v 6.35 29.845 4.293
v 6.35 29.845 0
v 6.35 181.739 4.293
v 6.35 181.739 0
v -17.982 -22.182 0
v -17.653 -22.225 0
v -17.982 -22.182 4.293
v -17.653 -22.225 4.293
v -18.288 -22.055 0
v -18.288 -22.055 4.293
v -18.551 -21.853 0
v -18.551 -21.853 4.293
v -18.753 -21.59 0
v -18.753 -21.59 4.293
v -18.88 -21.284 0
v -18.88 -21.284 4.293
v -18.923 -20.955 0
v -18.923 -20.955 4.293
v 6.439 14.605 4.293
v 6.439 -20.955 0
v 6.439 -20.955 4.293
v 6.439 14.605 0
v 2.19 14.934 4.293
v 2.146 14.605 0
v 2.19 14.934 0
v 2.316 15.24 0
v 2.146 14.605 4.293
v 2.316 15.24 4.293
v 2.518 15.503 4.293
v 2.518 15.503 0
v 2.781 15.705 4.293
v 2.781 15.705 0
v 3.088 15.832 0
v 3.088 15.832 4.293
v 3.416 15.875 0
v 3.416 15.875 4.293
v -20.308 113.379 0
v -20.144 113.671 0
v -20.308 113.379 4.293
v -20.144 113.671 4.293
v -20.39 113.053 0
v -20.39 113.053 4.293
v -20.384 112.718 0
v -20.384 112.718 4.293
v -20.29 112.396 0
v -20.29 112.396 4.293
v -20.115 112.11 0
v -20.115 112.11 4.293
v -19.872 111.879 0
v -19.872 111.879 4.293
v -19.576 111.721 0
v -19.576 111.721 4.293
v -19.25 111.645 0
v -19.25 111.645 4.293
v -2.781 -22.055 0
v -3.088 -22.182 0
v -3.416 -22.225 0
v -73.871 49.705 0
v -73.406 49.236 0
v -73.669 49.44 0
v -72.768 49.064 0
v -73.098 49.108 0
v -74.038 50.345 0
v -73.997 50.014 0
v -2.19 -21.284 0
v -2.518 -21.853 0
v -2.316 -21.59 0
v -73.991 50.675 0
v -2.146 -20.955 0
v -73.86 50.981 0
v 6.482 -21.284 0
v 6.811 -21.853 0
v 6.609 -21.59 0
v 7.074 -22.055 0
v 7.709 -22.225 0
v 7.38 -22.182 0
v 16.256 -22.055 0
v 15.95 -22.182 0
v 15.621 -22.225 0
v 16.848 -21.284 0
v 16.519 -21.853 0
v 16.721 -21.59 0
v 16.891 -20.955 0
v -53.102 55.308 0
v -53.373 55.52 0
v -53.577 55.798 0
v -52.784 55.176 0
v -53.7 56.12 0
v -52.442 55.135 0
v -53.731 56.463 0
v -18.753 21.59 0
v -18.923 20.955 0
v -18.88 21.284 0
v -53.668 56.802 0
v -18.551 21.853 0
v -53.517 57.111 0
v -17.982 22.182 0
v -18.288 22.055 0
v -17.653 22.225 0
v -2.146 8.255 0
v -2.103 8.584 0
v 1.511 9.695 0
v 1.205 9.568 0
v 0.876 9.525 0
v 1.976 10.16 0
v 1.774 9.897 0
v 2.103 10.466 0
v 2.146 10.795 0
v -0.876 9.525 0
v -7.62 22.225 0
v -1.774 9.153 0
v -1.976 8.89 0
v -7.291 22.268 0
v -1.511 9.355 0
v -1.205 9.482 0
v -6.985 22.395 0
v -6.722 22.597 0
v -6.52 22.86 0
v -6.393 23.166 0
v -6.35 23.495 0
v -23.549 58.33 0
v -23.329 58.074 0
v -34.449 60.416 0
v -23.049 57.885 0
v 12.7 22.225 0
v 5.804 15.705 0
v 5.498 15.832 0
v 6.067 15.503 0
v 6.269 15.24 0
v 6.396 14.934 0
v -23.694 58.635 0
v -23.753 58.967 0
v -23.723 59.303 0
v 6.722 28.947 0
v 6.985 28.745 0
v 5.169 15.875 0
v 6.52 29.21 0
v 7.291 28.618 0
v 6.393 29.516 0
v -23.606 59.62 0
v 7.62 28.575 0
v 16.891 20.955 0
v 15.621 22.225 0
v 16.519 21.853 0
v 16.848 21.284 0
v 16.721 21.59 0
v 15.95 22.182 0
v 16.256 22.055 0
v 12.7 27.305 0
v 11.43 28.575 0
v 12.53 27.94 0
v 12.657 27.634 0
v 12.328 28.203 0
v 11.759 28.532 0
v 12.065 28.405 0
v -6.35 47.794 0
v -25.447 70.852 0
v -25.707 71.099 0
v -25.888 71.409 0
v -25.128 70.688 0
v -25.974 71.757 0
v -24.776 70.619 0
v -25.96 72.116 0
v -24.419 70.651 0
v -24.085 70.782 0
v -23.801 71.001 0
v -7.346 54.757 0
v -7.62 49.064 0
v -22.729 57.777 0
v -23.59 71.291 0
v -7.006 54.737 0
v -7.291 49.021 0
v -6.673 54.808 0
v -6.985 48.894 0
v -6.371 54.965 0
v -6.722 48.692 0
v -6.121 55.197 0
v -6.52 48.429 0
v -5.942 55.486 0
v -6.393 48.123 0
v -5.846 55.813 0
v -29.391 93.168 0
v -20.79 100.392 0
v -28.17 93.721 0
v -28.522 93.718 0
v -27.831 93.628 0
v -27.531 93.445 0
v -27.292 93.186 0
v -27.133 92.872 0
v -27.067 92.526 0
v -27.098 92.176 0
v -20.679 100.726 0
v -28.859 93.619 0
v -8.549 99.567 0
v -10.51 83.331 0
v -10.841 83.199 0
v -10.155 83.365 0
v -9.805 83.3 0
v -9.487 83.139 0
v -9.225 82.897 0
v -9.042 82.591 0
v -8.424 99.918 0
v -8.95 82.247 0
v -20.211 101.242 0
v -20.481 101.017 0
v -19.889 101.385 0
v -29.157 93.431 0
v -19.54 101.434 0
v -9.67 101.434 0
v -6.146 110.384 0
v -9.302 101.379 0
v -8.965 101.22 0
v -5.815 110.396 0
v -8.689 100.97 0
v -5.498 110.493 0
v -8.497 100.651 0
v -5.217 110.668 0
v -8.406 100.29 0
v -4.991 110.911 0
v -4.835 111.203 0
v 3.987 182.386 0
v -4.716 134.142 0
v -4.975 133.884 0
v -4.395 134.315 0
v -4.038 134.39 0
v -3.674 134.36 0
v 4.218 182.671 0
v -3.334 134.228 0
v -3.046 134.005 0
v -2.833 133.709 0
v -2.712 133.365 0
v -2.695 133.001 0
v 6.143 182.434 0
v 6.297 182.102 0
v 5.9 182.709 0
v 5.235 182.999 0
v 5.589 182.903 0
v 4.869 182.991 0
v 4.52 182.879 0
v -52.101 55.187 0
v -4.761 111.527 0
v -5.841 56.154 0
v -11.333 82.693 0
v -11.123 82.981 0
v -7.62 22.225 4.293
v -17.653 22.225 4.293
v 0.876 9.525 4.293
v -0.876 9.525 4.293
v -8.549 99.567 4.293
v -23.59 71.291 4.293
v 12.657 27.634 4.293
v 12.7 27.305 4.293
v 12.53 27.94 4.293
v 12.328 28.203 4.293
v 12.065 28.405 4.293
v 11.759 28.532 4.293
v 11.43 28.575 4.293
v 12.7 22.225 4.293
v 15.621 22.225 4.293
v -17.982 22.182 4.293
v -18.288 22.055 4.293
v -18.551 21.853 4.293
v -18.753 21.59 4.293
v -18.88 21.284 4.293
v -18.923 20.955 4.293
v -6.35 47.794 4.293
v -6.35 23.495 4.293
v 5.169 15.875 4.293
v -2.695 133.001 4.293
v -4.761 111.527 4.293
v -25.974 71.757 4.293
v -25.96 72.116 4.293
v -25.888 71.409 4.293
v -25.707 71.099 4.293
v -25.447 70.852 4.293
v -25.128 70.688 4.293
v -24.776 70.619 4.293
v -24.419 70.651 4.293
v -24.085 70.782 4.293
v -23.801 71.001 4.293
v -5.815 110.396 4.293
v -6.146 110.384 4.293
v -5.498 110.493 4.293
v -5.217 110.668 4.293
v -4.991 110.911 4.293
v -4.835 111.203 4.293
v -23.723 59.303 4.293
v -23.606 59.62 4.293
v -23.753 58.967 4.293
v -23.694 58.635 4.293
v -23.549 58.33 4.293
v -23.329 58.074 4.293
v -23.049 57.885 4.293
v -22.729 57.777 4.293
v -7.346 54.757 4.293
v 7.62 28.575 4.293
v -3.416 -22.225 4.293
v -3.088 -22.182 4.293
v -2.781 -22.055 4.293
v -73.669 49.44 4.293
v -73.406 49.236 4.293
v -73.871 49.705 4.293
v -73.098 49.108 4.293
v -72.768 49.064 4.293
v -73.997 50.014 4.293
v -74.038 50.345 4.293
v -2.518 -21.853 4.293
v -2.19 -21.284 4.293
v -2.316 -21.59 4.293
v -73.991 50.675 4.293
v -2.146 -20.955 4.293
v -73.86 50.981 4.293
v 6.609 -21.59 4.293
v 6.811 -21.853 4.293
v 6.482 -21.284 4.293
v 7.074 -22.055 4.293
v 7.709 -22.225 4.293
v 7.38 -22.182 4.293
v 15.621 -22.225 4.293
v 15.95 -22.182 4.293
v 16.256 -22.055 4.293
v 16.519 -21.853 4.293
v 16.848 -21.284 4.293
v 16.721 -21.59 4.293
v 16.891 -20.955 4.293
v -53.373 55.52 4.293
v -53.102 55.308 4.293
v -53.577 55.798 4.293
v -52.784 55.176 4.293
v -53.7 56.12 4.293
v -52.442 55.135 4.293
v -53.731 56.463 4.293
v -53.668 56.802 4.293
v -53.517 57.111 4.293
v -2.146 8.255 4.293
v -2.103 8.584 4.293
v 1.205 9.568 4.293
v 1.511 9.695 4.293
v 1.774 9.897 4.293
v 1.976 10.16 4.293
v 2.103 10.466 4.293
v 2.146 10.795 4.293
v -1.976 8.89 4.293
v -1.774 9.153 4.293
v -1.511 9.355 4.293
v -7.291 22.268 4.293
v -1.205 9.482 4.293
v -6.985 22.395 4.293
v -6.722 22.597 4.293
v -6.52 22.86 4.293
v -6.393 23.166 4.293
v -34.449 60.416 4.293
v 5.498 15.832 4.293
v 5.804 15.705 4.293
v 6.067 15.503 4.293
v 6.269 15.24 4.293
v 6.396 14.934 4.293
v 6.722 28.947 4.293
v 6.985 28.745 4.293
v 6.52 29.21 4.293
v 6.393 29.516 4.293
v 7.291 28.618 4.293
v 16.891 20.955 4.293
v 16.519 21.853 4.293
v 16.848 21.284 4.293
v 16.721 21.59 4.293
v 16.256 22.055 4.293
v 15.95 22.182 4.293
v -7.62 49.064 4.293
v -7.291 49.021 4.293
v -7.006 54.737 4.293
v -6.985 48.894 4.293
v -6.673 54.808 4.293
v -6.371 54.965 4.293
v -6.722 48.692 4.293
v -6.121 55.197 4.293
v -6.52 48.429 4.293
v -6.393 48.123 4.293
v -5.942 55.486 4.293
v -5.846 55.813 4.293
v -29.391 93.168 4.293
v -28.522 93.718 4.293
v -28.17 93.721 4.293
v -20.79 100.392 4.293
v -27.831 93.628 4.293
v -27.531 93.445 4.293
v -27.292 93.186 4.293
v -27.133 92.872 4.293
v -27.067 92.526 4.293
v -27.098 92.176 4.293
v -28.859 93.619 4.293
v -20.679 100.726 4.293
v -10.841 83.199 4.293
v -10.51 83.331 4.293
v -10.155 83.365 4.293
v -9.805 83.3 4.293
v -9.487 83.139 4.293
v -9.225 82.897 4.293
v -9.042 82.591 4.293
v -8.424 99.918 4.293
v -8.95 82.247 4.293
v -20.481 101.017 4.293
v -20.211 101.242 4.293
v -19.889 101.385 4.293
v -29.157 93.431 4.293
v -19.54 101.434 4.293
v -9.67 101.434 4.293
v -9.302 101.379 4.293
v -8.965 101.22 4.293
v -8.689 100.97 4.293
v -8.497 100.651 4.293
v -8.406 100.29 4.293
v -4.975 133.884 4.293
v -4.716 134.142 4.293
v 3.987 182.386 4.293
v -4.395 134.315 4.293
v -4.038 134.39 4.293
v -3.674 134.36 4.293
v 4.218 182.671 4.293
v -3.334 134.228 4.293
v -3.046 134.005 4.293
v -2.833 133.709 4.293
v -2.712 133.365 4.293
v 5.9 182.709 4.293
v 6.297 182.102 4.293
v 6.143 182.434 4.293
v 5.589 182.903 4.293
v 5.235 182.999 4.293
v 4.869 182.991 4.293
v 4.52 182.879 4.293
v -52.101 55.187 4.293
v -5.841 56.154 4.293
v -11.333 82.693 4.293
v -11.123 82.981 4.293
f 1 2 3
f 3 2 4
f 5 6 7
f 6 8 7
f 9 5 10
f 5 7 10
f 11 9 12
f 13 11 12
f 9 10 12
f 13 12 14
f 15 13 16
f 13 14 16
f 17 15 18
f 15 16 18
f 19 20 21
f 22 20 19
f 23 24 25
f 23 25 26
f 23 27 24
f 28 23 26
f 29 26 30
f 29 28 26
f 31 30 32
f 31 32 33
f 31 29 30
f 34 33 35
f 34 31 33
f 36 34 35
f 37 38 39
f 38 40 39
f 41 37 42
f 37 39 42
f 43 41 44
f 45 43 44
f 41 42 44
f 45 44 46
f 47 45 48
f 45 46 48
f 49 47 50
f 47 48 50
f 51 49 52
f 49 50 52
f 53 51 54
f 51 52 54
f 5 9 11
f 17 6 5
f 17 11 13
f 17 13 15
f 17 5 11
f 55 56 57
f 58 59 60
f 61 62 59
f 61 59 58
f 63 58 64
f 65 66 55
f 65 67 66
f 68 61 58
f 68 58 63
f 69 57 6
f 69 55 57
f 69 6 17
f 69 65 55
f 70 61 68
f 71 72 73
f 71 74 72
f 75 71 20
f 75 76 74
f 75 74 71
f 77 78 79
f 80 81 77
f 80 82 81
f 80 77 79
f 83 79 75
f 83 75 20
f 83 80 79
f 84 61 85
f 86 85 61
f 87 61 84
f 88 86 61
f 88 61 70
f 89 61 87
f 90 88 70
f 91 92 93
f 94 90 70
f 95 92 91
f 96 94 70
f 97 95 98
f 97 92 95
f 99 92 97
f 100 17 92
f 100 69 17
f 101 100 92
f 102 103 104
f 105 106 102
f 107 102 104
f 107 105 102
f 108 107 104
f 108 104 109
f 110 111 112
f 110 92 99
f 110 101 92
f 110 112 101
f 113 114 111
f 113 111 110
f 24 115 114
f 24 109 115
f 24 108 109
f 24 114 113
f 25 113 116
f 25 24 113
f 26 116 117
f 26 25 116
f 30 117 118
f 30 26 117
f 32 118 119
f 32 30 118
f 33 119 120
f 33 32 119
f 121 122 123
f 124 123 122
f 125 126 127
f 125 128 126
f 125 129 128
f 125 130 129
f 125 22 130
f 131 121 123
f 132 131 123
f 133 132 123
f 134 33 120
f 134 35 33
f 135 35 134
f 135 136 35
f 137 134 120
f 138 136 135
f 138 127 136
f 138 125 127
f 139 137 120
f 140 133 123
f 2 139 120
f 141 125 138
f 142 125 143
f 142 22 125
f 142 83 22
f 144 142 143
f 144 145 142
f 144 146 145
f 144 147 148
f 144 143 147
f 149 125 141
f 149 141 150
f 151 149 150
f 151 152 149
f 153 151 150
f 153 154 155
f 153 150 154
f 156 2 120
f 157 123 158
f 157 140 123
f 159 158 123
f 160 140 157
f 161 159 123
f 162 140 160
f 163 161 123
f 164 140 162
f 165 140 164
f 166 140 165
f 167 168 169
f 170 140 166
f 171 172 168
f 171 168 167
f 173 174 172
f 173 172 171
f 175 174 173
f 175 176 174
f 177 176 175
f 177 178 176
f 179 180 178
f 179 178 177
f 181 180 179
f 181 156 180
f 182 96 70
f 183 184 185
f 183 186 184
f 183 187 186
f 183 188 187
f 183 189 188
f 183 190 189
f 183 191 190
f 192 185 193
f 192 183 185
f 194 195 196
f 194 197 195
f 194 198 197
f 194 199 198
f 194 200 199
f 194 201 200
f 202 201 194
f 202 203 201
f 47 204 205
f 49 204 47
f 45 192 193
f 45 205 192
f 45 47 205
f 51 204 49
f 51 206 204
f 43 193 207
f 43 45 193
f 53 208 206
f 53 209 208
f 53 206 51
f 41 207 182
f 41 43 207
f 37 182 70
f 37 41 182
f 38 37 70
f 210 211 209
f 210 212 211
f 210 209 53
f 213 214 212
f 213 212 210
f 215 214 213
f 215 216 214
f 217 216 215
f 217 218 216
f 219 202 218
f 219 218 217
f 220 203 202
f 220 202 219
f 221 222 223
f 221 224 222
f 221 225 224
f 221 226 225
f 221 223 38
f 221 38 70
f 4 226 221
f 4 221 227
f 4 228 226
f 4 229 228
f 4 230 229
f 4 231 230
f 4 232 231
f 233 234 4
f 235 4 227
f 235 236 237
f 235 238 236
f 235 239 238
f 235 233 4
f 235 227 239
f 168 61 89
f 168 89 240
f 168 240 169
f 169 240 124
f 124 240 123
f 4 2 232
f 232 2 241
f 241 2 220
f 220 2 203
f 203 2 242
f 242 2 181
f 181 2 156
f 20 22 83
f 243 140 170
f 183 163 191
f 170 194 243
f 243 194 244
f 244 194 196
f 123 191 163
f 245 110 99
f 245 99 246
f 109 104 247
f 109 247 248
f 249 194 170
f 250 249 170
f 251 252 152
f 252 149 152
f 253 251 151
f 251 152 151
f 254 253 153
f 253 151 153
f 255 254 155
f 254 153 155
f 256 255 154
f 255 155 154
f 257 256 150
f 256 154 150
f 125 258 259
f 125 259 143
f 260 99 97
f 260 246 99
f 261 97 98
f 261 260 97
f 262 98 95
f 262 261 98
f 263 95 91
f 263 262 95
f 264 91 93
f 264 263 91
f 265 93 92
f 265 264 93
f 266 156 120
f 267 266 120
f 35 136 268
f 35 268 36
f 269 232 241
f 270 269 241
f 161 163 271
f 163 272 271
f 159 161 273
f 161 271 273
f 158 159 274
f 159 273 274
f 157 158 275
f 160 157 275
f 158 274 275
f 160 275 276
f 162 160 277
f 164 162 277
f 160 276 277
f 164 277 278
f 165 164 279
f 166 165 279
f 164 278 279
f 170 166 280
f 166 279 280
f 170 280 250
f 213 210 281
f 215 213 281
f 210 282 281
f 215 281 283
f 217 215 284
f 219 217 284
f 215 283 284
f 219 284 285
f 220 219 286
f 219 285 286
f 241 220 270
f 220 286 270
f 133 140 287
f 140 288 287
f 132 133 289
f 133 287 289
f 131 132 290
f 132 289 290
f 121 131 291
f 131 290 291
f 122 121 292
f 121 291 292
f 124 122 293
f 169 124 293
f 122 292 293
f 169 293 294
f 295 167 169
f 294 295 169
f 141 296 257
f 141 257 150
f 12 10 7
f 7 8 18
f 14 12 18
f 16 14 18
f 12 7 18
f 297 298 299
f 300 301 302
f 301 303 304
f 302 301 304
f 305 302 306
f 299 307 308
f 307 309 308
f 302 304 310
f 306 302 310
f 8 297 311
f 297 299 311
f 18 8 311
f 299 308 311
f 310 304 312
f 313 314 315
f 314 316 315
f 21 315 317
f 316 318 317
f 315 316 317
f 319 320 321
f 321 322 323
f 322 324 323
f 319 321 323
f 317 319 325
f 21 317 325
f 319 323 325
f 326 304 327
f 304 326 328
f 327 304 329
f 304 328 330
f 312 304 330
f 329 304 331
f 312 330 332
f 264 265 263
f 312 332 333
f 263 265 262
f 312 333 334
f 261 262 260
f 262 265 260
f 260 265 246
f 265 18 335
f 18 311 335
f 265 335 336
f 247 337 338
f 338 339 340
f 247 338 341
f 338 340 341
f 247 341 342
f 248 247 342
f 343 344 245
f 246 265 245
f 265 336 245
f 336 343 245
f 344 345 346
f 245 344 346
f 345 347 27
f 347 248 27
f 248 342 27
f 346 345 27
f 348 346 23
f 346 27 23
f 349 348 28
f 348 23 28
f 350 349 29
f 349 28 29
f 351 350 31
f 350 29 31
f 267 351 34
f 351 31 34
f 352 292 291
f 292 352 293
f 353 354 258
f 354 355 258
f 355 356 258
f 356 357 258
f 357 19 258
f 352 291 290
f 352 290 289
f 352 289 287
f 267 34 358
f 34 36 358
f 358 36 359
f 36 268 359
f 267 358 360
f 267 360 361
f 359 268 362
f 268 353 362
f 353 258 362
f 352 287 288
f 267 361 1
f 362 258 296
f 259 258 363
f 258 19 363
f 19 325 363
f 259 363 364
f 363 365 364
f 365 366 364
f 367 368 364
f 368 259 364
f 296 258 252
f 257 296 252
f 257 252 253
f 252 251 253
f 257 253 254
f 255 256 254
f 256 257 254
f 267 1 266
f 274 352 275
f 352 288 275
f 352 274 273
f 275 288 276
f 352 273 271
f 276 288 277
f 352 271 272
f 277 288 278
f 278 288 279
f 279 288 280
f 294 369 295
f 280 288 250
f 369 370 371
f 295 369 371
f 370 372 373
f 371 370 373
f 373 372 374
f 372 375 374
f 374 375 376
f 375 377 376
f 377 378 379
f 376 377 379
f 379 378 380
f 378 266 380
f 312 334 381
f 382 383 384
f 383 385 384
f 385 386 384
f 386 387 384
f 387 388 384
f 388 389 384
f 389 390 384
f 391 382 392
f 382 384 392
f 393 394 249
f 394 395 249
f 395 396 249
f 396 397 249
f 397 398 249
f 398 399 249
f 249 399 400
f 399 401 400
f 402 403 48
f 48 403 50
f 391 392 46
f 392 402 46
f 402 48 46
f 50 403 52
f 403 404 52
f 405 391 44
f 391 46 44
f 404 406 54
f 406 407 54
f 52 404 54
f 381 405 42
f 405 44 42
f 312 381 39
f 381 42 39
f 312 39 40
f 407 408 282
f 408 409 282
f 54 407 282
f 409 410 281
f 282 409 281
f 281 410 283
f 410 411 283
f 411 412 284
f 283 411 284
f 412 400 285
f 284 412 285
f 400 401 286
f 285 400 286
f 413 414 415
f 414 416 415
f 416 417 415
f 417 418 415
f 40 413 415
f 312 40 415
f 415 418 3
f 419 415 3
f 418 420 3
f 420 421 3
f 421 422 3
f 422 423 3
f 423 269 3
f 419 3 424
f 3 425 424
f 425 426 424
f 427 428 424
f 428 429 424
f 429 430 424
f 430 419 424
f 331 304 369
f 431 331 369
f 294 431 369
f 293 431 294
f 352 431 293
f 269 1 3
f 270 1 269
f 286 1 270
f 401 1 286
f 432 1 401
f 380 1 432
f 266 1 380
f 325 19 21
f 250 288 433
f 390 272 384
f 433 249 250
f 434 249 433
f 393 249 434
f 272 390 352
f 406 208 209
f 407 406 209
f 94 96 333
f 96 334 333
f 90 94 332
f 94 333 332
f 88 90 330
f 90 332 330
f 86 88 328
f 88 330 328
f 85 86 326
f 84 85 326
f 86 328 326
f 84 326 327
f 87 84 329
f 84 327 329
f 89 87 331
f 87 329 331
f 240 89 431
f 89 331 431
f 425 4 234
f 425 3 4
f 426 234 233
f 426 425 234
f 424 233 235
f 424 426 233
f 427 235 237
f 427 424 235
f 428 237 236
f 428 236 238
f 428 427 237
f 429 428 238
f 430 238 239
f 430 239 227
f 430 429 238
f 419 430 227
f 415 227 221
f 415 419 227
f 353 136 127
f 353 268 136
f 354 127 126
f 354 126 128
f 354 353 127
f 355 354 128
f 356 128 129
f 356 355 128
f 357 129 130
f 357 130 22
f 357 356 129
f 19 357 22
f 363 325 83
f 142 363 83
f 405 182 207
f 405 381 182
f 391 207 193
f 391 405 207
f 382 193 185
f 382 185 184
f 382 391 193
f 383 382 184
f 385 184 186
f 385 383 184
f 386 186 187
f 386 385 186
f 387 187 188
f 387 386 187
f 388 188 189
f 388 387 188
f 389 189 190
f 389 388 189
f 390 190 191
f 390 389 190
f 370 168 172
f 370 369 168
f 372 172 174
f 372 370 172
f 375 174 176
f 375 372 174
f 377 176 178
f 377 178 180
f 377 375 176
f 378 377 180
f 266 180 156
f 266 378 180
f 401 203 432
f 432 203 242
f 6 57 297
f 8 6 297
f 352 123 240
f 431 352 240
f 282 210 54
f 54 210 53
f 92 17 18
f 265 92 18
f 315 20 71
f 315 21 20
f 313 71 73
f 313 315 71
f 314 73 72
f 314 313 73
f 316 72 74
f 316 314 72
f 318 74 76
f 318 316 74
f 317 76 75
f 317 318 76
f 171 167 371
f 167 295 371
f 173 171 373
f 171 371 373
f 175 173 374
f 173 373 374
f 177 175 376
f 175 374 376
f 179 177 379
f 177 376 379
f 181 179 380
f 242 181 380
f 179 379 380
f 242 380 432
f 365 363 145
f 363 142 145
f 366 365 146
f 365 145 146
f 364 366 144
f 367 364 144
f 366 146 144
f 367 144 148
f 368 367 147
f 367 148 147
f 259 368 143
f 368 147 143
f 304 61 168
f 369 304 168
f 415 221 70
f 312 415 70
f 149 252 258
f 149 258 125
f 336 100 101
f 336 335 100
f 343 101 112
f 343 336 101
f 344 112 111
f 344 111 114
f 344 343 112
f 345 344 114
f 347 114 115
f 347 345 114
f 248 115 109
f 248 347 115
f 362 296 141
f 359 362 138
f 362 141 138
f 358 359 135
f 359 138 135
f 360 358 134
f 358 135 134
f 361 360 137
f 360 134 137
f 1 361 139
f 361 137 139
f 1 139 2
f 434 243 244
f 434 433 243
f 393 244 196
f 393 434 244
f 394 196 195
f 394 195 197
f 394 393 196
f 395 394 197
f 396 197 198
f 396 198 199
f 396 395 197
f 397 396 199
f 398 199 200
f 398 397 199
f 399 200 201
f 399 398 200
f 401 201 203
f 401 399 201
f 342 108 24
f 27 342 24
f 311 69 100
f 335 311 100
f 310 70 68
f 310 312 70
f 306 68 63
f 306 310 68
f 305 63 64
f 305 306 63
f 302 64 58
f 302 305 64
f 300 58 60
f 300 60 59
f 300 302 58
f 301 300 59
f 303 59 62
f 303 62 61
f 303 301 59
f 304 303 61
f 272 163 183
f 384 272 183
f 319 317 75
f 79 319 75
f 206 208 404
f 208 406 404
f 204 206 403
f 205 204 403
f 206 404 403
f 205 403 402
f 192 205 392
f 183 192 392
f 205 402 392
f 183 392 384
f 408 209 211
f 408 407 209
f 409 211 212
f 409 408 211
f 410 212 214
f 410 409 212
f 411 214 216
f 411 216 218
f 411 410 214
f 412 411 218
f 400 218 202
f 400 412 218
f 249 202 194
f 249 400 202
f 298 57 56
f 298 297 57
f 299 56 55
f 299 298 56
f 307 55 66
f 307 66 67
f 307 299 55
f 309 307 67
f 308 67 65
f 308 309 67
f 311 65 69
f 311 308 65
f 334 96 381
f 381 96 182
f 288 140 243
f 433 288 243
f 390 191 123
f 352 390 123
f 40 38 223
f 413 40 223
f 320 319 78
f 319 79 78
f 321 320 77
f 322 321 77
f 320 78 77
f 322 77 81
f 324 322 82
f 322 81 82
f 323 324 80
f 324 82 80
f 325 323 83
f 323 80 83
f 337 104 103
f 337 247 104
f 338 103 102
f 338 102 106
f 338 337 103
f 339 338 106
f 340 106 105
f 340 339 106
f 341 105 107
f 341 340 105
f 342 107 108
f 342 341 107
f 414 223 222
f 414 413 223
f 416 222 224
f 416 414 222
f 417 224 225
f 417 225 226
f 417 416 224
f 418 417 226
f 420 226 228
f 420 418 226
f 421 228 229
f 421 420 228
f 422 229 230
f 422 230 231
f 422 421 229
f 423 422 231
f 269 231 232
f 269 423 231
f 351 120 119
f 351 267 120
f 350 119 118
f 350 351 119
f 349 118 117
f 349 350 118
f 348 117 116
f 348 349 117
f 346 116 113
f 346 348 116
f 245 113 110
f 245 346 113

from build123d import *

# Parameters (mm, degrees)
BOSS_EXTRUDE2_DEPTH = 4.2926
BOSS_EXTRUDE3_DEPTH = 4.2926
CUT_EXTRUDE1_DEPTH  = 4.2926
FILLET3_R           = 1.27
SKETCH5_W           = 4.2926
SKETCH5_H           = 31.75
CUT_EXTRUDE2_DEPTH  = 4.2926
SKETCH6_W           = 4.2926
SKETCH6_H           = 38.1
CUT_EXTRUDE3_DEPTH  = 4.2926
SKETCH9_W           = 4.2926
SKETCH9_H           = 44.45
BOSS_EXTRUDE4_DEPTH = 6.35
SKETCH10_W          = 4.2926
SKETCH10_H          = 6.35
BOSS_EXTRUDE5_DEPTH = 6.35
SKETCH12_W          = 4.2926
SKETCH12_H          = 44.45
BOSS_EXTRUDE6_DEPTH = 8.382
FILLET4_R           = 1.27


with BuildPart() as part:
    # Sketch2 → Boss-Extrude2 (new body)
    with BuildSketch(Plane.XY):
        Polygon((6.35, 22.225), (6.35, 101.6), (-6.35, 101.6), (-6.35, 22.225), (-10.541, 22.225), (-10.541, -22.225), (10.541, -22.225), (10.541, 22.225), align=None)
    extrude(amount=BOSS_EXTRUDE2_DEPTH)

    # Sketch2<3> → Boss-Extrude3 (add)
    with BuildSketch(Plane.XY):
        Polygon((-6.35, 101.6), (6.35, 101.6), (6.35, 186.37430696), (-74.996081542, 49.06413634), (-6.35, 49.06413634), align=None)
    extrude(amount=BOSS_EXTRUDE3_DEPTH)

    # Sketch4 → Cut-Extrude1 (cut)
    with BuildSketch(Plane(origin=(0, 0, 0), x_dir=(-1, 0, 0), z_dir=(0, 0, -1))):
        Polygon((2.26175511, 137.499289153), (4.882176806, 110.262347972), (21.501956662, 111.86130989), align=None)
        Polygon((25.53449714, 98.932202401), (34.449187247, 60.416195476), (55.473168553, 54.188396298), align=None)
        Polygon((9.42992166, 86.270055499), (5.634016985, 54.421399088), (24.410527091, 58.107059129), align=None)
        Polygon((7.556063617, 101.433706887), (27.432097362, 64.067482354), (20.599137511, 101.433706887), align=None)
    extrude(amount=-CUT_EXTRUDE1_DEPTH, mode=Mode.SUBTRACT)

    # Fillet3
    fillet3_edges = [part.edges().sort_by_distance(p)[0] for p in [
        (6.35, 186.37430696, 2.1463),
        (-74.996081542, 49.06413634, 2.1463),
        (-6.35, 49.06413634, 2.1463),
        (-20.599137511, 101.433706887, 2.1463),
        (-7.556063617, 101.433706887, 2.1463),
        (-21.501956662, 111.86130989, 2.1463),
        (-4.882176806, 110.262347972, 2.1463),
        (-2.26175511, 137.499289153, 2.1463),
        (-25.53449714, 98.932202401, 2.1463),
        (-55.473168553, 54.188396298, 2.1463),
        (-27.432097362, 64.067482354, 2.1463),
        (-9.42992166, 86.270055499, 2.1463),
        (-5.634016985, 54.421399088, 2.1463),
        (-24.410527091, 58.107059129, 2.1463),
    ]]
    fillet(fillet3_edges, radius=FILLET3_R)

    # Sketch5 → Cut-Extrude2 (cut)
    with BuildSketch(Plane(origin=(0, 0, 0), x_dir=(-1, 0, 0), z_dir=(0, 0, -1))):
        with Locations((0, -6.35)):
            Rectangle(SKETCH5_W, SKETCH5_H)
    extrude(amount=-CUT_EXTRUDE2_DEPTH, mode=Mode.SUBTRACT)

    # Sketch6 → Cut-Extrude3 (cut)
    with BuildSketch(Plane(origin=(0, 0, 0), x_dir=(-1, 0, 0), z_dir=(0, 0, -1))):
        with Locations((-4.2926, -3.175)):
            Rectangle(SKETCH6_W, SKETCH6_H)
    extrude(amount=-CUT_EXTRUDE3_DEPTH, mode=Mode.SUBTRACT)

    # Sketch9 → Boss-Extrude4 (add)
    with BuildSketch(Plane(origin=(10.541, 0, 0), x_dir=(0, 0, -1), z_dir=(1, 0, 0))):
        with Locations((-2.1463, 0)):
            Rectangle(SKETCH9_W, SKETCH9_H)
    extrude(amount=BOSS_EXTRUDE4_DEPTH)

    # Sketch10 → Boss-Extrude5 (add)
    with BuildSketch(Plane(origin=(6.35, 0, 0), x_dir=(0, 0, -1), z_dir=(1, 0, 0))):
        with Locations((-2.1463, 25.4)):
            Rectangle(SKETCH10_W, SKETCH10_H)
    extrude(amount=BOSS_EXTRUDE5_DEPTH)

    # Sketch12 → Boss-Extrude6 (add)
    with BuildSketch(Plane.ZY.offset(10.541)):
        with Locations((2.1463, 0)):
            Rectangle(SKETCH12_W, SKETCH12_H)
    extrude(amount=BOSS_EXTRUDE6_DEPTH)

    # Fillet4
    fillet4_edges = [part.edges().sort_by_distance(p)[0] for p in [
        (6.4389, 15.875, 2.1463),
        (2.1463, 15.875, 2.1463),
        (-2.1463, 9.525, 2.1463),
        (2.1463, 9.525, 2.1463),
        (-6.35, 22.225, 2.1463),
        (-2.1463, -22.225, 2.1463),
        (6.4389, -22.225, 2.1463),
        (16.891, -22.225, 2.1463),
        (16.891, 22.225, 2.1463),
        (6.35, 28.575, 2.1463),
        (12.7, 28.575, 2.1463),
        (-18.923, -22.225, 2.1463),
        (-18.923, 22.225, 2.1463),
    ]]
    fillet(fillet4_edges, radius=FILLET4_R)


solid = part.part
